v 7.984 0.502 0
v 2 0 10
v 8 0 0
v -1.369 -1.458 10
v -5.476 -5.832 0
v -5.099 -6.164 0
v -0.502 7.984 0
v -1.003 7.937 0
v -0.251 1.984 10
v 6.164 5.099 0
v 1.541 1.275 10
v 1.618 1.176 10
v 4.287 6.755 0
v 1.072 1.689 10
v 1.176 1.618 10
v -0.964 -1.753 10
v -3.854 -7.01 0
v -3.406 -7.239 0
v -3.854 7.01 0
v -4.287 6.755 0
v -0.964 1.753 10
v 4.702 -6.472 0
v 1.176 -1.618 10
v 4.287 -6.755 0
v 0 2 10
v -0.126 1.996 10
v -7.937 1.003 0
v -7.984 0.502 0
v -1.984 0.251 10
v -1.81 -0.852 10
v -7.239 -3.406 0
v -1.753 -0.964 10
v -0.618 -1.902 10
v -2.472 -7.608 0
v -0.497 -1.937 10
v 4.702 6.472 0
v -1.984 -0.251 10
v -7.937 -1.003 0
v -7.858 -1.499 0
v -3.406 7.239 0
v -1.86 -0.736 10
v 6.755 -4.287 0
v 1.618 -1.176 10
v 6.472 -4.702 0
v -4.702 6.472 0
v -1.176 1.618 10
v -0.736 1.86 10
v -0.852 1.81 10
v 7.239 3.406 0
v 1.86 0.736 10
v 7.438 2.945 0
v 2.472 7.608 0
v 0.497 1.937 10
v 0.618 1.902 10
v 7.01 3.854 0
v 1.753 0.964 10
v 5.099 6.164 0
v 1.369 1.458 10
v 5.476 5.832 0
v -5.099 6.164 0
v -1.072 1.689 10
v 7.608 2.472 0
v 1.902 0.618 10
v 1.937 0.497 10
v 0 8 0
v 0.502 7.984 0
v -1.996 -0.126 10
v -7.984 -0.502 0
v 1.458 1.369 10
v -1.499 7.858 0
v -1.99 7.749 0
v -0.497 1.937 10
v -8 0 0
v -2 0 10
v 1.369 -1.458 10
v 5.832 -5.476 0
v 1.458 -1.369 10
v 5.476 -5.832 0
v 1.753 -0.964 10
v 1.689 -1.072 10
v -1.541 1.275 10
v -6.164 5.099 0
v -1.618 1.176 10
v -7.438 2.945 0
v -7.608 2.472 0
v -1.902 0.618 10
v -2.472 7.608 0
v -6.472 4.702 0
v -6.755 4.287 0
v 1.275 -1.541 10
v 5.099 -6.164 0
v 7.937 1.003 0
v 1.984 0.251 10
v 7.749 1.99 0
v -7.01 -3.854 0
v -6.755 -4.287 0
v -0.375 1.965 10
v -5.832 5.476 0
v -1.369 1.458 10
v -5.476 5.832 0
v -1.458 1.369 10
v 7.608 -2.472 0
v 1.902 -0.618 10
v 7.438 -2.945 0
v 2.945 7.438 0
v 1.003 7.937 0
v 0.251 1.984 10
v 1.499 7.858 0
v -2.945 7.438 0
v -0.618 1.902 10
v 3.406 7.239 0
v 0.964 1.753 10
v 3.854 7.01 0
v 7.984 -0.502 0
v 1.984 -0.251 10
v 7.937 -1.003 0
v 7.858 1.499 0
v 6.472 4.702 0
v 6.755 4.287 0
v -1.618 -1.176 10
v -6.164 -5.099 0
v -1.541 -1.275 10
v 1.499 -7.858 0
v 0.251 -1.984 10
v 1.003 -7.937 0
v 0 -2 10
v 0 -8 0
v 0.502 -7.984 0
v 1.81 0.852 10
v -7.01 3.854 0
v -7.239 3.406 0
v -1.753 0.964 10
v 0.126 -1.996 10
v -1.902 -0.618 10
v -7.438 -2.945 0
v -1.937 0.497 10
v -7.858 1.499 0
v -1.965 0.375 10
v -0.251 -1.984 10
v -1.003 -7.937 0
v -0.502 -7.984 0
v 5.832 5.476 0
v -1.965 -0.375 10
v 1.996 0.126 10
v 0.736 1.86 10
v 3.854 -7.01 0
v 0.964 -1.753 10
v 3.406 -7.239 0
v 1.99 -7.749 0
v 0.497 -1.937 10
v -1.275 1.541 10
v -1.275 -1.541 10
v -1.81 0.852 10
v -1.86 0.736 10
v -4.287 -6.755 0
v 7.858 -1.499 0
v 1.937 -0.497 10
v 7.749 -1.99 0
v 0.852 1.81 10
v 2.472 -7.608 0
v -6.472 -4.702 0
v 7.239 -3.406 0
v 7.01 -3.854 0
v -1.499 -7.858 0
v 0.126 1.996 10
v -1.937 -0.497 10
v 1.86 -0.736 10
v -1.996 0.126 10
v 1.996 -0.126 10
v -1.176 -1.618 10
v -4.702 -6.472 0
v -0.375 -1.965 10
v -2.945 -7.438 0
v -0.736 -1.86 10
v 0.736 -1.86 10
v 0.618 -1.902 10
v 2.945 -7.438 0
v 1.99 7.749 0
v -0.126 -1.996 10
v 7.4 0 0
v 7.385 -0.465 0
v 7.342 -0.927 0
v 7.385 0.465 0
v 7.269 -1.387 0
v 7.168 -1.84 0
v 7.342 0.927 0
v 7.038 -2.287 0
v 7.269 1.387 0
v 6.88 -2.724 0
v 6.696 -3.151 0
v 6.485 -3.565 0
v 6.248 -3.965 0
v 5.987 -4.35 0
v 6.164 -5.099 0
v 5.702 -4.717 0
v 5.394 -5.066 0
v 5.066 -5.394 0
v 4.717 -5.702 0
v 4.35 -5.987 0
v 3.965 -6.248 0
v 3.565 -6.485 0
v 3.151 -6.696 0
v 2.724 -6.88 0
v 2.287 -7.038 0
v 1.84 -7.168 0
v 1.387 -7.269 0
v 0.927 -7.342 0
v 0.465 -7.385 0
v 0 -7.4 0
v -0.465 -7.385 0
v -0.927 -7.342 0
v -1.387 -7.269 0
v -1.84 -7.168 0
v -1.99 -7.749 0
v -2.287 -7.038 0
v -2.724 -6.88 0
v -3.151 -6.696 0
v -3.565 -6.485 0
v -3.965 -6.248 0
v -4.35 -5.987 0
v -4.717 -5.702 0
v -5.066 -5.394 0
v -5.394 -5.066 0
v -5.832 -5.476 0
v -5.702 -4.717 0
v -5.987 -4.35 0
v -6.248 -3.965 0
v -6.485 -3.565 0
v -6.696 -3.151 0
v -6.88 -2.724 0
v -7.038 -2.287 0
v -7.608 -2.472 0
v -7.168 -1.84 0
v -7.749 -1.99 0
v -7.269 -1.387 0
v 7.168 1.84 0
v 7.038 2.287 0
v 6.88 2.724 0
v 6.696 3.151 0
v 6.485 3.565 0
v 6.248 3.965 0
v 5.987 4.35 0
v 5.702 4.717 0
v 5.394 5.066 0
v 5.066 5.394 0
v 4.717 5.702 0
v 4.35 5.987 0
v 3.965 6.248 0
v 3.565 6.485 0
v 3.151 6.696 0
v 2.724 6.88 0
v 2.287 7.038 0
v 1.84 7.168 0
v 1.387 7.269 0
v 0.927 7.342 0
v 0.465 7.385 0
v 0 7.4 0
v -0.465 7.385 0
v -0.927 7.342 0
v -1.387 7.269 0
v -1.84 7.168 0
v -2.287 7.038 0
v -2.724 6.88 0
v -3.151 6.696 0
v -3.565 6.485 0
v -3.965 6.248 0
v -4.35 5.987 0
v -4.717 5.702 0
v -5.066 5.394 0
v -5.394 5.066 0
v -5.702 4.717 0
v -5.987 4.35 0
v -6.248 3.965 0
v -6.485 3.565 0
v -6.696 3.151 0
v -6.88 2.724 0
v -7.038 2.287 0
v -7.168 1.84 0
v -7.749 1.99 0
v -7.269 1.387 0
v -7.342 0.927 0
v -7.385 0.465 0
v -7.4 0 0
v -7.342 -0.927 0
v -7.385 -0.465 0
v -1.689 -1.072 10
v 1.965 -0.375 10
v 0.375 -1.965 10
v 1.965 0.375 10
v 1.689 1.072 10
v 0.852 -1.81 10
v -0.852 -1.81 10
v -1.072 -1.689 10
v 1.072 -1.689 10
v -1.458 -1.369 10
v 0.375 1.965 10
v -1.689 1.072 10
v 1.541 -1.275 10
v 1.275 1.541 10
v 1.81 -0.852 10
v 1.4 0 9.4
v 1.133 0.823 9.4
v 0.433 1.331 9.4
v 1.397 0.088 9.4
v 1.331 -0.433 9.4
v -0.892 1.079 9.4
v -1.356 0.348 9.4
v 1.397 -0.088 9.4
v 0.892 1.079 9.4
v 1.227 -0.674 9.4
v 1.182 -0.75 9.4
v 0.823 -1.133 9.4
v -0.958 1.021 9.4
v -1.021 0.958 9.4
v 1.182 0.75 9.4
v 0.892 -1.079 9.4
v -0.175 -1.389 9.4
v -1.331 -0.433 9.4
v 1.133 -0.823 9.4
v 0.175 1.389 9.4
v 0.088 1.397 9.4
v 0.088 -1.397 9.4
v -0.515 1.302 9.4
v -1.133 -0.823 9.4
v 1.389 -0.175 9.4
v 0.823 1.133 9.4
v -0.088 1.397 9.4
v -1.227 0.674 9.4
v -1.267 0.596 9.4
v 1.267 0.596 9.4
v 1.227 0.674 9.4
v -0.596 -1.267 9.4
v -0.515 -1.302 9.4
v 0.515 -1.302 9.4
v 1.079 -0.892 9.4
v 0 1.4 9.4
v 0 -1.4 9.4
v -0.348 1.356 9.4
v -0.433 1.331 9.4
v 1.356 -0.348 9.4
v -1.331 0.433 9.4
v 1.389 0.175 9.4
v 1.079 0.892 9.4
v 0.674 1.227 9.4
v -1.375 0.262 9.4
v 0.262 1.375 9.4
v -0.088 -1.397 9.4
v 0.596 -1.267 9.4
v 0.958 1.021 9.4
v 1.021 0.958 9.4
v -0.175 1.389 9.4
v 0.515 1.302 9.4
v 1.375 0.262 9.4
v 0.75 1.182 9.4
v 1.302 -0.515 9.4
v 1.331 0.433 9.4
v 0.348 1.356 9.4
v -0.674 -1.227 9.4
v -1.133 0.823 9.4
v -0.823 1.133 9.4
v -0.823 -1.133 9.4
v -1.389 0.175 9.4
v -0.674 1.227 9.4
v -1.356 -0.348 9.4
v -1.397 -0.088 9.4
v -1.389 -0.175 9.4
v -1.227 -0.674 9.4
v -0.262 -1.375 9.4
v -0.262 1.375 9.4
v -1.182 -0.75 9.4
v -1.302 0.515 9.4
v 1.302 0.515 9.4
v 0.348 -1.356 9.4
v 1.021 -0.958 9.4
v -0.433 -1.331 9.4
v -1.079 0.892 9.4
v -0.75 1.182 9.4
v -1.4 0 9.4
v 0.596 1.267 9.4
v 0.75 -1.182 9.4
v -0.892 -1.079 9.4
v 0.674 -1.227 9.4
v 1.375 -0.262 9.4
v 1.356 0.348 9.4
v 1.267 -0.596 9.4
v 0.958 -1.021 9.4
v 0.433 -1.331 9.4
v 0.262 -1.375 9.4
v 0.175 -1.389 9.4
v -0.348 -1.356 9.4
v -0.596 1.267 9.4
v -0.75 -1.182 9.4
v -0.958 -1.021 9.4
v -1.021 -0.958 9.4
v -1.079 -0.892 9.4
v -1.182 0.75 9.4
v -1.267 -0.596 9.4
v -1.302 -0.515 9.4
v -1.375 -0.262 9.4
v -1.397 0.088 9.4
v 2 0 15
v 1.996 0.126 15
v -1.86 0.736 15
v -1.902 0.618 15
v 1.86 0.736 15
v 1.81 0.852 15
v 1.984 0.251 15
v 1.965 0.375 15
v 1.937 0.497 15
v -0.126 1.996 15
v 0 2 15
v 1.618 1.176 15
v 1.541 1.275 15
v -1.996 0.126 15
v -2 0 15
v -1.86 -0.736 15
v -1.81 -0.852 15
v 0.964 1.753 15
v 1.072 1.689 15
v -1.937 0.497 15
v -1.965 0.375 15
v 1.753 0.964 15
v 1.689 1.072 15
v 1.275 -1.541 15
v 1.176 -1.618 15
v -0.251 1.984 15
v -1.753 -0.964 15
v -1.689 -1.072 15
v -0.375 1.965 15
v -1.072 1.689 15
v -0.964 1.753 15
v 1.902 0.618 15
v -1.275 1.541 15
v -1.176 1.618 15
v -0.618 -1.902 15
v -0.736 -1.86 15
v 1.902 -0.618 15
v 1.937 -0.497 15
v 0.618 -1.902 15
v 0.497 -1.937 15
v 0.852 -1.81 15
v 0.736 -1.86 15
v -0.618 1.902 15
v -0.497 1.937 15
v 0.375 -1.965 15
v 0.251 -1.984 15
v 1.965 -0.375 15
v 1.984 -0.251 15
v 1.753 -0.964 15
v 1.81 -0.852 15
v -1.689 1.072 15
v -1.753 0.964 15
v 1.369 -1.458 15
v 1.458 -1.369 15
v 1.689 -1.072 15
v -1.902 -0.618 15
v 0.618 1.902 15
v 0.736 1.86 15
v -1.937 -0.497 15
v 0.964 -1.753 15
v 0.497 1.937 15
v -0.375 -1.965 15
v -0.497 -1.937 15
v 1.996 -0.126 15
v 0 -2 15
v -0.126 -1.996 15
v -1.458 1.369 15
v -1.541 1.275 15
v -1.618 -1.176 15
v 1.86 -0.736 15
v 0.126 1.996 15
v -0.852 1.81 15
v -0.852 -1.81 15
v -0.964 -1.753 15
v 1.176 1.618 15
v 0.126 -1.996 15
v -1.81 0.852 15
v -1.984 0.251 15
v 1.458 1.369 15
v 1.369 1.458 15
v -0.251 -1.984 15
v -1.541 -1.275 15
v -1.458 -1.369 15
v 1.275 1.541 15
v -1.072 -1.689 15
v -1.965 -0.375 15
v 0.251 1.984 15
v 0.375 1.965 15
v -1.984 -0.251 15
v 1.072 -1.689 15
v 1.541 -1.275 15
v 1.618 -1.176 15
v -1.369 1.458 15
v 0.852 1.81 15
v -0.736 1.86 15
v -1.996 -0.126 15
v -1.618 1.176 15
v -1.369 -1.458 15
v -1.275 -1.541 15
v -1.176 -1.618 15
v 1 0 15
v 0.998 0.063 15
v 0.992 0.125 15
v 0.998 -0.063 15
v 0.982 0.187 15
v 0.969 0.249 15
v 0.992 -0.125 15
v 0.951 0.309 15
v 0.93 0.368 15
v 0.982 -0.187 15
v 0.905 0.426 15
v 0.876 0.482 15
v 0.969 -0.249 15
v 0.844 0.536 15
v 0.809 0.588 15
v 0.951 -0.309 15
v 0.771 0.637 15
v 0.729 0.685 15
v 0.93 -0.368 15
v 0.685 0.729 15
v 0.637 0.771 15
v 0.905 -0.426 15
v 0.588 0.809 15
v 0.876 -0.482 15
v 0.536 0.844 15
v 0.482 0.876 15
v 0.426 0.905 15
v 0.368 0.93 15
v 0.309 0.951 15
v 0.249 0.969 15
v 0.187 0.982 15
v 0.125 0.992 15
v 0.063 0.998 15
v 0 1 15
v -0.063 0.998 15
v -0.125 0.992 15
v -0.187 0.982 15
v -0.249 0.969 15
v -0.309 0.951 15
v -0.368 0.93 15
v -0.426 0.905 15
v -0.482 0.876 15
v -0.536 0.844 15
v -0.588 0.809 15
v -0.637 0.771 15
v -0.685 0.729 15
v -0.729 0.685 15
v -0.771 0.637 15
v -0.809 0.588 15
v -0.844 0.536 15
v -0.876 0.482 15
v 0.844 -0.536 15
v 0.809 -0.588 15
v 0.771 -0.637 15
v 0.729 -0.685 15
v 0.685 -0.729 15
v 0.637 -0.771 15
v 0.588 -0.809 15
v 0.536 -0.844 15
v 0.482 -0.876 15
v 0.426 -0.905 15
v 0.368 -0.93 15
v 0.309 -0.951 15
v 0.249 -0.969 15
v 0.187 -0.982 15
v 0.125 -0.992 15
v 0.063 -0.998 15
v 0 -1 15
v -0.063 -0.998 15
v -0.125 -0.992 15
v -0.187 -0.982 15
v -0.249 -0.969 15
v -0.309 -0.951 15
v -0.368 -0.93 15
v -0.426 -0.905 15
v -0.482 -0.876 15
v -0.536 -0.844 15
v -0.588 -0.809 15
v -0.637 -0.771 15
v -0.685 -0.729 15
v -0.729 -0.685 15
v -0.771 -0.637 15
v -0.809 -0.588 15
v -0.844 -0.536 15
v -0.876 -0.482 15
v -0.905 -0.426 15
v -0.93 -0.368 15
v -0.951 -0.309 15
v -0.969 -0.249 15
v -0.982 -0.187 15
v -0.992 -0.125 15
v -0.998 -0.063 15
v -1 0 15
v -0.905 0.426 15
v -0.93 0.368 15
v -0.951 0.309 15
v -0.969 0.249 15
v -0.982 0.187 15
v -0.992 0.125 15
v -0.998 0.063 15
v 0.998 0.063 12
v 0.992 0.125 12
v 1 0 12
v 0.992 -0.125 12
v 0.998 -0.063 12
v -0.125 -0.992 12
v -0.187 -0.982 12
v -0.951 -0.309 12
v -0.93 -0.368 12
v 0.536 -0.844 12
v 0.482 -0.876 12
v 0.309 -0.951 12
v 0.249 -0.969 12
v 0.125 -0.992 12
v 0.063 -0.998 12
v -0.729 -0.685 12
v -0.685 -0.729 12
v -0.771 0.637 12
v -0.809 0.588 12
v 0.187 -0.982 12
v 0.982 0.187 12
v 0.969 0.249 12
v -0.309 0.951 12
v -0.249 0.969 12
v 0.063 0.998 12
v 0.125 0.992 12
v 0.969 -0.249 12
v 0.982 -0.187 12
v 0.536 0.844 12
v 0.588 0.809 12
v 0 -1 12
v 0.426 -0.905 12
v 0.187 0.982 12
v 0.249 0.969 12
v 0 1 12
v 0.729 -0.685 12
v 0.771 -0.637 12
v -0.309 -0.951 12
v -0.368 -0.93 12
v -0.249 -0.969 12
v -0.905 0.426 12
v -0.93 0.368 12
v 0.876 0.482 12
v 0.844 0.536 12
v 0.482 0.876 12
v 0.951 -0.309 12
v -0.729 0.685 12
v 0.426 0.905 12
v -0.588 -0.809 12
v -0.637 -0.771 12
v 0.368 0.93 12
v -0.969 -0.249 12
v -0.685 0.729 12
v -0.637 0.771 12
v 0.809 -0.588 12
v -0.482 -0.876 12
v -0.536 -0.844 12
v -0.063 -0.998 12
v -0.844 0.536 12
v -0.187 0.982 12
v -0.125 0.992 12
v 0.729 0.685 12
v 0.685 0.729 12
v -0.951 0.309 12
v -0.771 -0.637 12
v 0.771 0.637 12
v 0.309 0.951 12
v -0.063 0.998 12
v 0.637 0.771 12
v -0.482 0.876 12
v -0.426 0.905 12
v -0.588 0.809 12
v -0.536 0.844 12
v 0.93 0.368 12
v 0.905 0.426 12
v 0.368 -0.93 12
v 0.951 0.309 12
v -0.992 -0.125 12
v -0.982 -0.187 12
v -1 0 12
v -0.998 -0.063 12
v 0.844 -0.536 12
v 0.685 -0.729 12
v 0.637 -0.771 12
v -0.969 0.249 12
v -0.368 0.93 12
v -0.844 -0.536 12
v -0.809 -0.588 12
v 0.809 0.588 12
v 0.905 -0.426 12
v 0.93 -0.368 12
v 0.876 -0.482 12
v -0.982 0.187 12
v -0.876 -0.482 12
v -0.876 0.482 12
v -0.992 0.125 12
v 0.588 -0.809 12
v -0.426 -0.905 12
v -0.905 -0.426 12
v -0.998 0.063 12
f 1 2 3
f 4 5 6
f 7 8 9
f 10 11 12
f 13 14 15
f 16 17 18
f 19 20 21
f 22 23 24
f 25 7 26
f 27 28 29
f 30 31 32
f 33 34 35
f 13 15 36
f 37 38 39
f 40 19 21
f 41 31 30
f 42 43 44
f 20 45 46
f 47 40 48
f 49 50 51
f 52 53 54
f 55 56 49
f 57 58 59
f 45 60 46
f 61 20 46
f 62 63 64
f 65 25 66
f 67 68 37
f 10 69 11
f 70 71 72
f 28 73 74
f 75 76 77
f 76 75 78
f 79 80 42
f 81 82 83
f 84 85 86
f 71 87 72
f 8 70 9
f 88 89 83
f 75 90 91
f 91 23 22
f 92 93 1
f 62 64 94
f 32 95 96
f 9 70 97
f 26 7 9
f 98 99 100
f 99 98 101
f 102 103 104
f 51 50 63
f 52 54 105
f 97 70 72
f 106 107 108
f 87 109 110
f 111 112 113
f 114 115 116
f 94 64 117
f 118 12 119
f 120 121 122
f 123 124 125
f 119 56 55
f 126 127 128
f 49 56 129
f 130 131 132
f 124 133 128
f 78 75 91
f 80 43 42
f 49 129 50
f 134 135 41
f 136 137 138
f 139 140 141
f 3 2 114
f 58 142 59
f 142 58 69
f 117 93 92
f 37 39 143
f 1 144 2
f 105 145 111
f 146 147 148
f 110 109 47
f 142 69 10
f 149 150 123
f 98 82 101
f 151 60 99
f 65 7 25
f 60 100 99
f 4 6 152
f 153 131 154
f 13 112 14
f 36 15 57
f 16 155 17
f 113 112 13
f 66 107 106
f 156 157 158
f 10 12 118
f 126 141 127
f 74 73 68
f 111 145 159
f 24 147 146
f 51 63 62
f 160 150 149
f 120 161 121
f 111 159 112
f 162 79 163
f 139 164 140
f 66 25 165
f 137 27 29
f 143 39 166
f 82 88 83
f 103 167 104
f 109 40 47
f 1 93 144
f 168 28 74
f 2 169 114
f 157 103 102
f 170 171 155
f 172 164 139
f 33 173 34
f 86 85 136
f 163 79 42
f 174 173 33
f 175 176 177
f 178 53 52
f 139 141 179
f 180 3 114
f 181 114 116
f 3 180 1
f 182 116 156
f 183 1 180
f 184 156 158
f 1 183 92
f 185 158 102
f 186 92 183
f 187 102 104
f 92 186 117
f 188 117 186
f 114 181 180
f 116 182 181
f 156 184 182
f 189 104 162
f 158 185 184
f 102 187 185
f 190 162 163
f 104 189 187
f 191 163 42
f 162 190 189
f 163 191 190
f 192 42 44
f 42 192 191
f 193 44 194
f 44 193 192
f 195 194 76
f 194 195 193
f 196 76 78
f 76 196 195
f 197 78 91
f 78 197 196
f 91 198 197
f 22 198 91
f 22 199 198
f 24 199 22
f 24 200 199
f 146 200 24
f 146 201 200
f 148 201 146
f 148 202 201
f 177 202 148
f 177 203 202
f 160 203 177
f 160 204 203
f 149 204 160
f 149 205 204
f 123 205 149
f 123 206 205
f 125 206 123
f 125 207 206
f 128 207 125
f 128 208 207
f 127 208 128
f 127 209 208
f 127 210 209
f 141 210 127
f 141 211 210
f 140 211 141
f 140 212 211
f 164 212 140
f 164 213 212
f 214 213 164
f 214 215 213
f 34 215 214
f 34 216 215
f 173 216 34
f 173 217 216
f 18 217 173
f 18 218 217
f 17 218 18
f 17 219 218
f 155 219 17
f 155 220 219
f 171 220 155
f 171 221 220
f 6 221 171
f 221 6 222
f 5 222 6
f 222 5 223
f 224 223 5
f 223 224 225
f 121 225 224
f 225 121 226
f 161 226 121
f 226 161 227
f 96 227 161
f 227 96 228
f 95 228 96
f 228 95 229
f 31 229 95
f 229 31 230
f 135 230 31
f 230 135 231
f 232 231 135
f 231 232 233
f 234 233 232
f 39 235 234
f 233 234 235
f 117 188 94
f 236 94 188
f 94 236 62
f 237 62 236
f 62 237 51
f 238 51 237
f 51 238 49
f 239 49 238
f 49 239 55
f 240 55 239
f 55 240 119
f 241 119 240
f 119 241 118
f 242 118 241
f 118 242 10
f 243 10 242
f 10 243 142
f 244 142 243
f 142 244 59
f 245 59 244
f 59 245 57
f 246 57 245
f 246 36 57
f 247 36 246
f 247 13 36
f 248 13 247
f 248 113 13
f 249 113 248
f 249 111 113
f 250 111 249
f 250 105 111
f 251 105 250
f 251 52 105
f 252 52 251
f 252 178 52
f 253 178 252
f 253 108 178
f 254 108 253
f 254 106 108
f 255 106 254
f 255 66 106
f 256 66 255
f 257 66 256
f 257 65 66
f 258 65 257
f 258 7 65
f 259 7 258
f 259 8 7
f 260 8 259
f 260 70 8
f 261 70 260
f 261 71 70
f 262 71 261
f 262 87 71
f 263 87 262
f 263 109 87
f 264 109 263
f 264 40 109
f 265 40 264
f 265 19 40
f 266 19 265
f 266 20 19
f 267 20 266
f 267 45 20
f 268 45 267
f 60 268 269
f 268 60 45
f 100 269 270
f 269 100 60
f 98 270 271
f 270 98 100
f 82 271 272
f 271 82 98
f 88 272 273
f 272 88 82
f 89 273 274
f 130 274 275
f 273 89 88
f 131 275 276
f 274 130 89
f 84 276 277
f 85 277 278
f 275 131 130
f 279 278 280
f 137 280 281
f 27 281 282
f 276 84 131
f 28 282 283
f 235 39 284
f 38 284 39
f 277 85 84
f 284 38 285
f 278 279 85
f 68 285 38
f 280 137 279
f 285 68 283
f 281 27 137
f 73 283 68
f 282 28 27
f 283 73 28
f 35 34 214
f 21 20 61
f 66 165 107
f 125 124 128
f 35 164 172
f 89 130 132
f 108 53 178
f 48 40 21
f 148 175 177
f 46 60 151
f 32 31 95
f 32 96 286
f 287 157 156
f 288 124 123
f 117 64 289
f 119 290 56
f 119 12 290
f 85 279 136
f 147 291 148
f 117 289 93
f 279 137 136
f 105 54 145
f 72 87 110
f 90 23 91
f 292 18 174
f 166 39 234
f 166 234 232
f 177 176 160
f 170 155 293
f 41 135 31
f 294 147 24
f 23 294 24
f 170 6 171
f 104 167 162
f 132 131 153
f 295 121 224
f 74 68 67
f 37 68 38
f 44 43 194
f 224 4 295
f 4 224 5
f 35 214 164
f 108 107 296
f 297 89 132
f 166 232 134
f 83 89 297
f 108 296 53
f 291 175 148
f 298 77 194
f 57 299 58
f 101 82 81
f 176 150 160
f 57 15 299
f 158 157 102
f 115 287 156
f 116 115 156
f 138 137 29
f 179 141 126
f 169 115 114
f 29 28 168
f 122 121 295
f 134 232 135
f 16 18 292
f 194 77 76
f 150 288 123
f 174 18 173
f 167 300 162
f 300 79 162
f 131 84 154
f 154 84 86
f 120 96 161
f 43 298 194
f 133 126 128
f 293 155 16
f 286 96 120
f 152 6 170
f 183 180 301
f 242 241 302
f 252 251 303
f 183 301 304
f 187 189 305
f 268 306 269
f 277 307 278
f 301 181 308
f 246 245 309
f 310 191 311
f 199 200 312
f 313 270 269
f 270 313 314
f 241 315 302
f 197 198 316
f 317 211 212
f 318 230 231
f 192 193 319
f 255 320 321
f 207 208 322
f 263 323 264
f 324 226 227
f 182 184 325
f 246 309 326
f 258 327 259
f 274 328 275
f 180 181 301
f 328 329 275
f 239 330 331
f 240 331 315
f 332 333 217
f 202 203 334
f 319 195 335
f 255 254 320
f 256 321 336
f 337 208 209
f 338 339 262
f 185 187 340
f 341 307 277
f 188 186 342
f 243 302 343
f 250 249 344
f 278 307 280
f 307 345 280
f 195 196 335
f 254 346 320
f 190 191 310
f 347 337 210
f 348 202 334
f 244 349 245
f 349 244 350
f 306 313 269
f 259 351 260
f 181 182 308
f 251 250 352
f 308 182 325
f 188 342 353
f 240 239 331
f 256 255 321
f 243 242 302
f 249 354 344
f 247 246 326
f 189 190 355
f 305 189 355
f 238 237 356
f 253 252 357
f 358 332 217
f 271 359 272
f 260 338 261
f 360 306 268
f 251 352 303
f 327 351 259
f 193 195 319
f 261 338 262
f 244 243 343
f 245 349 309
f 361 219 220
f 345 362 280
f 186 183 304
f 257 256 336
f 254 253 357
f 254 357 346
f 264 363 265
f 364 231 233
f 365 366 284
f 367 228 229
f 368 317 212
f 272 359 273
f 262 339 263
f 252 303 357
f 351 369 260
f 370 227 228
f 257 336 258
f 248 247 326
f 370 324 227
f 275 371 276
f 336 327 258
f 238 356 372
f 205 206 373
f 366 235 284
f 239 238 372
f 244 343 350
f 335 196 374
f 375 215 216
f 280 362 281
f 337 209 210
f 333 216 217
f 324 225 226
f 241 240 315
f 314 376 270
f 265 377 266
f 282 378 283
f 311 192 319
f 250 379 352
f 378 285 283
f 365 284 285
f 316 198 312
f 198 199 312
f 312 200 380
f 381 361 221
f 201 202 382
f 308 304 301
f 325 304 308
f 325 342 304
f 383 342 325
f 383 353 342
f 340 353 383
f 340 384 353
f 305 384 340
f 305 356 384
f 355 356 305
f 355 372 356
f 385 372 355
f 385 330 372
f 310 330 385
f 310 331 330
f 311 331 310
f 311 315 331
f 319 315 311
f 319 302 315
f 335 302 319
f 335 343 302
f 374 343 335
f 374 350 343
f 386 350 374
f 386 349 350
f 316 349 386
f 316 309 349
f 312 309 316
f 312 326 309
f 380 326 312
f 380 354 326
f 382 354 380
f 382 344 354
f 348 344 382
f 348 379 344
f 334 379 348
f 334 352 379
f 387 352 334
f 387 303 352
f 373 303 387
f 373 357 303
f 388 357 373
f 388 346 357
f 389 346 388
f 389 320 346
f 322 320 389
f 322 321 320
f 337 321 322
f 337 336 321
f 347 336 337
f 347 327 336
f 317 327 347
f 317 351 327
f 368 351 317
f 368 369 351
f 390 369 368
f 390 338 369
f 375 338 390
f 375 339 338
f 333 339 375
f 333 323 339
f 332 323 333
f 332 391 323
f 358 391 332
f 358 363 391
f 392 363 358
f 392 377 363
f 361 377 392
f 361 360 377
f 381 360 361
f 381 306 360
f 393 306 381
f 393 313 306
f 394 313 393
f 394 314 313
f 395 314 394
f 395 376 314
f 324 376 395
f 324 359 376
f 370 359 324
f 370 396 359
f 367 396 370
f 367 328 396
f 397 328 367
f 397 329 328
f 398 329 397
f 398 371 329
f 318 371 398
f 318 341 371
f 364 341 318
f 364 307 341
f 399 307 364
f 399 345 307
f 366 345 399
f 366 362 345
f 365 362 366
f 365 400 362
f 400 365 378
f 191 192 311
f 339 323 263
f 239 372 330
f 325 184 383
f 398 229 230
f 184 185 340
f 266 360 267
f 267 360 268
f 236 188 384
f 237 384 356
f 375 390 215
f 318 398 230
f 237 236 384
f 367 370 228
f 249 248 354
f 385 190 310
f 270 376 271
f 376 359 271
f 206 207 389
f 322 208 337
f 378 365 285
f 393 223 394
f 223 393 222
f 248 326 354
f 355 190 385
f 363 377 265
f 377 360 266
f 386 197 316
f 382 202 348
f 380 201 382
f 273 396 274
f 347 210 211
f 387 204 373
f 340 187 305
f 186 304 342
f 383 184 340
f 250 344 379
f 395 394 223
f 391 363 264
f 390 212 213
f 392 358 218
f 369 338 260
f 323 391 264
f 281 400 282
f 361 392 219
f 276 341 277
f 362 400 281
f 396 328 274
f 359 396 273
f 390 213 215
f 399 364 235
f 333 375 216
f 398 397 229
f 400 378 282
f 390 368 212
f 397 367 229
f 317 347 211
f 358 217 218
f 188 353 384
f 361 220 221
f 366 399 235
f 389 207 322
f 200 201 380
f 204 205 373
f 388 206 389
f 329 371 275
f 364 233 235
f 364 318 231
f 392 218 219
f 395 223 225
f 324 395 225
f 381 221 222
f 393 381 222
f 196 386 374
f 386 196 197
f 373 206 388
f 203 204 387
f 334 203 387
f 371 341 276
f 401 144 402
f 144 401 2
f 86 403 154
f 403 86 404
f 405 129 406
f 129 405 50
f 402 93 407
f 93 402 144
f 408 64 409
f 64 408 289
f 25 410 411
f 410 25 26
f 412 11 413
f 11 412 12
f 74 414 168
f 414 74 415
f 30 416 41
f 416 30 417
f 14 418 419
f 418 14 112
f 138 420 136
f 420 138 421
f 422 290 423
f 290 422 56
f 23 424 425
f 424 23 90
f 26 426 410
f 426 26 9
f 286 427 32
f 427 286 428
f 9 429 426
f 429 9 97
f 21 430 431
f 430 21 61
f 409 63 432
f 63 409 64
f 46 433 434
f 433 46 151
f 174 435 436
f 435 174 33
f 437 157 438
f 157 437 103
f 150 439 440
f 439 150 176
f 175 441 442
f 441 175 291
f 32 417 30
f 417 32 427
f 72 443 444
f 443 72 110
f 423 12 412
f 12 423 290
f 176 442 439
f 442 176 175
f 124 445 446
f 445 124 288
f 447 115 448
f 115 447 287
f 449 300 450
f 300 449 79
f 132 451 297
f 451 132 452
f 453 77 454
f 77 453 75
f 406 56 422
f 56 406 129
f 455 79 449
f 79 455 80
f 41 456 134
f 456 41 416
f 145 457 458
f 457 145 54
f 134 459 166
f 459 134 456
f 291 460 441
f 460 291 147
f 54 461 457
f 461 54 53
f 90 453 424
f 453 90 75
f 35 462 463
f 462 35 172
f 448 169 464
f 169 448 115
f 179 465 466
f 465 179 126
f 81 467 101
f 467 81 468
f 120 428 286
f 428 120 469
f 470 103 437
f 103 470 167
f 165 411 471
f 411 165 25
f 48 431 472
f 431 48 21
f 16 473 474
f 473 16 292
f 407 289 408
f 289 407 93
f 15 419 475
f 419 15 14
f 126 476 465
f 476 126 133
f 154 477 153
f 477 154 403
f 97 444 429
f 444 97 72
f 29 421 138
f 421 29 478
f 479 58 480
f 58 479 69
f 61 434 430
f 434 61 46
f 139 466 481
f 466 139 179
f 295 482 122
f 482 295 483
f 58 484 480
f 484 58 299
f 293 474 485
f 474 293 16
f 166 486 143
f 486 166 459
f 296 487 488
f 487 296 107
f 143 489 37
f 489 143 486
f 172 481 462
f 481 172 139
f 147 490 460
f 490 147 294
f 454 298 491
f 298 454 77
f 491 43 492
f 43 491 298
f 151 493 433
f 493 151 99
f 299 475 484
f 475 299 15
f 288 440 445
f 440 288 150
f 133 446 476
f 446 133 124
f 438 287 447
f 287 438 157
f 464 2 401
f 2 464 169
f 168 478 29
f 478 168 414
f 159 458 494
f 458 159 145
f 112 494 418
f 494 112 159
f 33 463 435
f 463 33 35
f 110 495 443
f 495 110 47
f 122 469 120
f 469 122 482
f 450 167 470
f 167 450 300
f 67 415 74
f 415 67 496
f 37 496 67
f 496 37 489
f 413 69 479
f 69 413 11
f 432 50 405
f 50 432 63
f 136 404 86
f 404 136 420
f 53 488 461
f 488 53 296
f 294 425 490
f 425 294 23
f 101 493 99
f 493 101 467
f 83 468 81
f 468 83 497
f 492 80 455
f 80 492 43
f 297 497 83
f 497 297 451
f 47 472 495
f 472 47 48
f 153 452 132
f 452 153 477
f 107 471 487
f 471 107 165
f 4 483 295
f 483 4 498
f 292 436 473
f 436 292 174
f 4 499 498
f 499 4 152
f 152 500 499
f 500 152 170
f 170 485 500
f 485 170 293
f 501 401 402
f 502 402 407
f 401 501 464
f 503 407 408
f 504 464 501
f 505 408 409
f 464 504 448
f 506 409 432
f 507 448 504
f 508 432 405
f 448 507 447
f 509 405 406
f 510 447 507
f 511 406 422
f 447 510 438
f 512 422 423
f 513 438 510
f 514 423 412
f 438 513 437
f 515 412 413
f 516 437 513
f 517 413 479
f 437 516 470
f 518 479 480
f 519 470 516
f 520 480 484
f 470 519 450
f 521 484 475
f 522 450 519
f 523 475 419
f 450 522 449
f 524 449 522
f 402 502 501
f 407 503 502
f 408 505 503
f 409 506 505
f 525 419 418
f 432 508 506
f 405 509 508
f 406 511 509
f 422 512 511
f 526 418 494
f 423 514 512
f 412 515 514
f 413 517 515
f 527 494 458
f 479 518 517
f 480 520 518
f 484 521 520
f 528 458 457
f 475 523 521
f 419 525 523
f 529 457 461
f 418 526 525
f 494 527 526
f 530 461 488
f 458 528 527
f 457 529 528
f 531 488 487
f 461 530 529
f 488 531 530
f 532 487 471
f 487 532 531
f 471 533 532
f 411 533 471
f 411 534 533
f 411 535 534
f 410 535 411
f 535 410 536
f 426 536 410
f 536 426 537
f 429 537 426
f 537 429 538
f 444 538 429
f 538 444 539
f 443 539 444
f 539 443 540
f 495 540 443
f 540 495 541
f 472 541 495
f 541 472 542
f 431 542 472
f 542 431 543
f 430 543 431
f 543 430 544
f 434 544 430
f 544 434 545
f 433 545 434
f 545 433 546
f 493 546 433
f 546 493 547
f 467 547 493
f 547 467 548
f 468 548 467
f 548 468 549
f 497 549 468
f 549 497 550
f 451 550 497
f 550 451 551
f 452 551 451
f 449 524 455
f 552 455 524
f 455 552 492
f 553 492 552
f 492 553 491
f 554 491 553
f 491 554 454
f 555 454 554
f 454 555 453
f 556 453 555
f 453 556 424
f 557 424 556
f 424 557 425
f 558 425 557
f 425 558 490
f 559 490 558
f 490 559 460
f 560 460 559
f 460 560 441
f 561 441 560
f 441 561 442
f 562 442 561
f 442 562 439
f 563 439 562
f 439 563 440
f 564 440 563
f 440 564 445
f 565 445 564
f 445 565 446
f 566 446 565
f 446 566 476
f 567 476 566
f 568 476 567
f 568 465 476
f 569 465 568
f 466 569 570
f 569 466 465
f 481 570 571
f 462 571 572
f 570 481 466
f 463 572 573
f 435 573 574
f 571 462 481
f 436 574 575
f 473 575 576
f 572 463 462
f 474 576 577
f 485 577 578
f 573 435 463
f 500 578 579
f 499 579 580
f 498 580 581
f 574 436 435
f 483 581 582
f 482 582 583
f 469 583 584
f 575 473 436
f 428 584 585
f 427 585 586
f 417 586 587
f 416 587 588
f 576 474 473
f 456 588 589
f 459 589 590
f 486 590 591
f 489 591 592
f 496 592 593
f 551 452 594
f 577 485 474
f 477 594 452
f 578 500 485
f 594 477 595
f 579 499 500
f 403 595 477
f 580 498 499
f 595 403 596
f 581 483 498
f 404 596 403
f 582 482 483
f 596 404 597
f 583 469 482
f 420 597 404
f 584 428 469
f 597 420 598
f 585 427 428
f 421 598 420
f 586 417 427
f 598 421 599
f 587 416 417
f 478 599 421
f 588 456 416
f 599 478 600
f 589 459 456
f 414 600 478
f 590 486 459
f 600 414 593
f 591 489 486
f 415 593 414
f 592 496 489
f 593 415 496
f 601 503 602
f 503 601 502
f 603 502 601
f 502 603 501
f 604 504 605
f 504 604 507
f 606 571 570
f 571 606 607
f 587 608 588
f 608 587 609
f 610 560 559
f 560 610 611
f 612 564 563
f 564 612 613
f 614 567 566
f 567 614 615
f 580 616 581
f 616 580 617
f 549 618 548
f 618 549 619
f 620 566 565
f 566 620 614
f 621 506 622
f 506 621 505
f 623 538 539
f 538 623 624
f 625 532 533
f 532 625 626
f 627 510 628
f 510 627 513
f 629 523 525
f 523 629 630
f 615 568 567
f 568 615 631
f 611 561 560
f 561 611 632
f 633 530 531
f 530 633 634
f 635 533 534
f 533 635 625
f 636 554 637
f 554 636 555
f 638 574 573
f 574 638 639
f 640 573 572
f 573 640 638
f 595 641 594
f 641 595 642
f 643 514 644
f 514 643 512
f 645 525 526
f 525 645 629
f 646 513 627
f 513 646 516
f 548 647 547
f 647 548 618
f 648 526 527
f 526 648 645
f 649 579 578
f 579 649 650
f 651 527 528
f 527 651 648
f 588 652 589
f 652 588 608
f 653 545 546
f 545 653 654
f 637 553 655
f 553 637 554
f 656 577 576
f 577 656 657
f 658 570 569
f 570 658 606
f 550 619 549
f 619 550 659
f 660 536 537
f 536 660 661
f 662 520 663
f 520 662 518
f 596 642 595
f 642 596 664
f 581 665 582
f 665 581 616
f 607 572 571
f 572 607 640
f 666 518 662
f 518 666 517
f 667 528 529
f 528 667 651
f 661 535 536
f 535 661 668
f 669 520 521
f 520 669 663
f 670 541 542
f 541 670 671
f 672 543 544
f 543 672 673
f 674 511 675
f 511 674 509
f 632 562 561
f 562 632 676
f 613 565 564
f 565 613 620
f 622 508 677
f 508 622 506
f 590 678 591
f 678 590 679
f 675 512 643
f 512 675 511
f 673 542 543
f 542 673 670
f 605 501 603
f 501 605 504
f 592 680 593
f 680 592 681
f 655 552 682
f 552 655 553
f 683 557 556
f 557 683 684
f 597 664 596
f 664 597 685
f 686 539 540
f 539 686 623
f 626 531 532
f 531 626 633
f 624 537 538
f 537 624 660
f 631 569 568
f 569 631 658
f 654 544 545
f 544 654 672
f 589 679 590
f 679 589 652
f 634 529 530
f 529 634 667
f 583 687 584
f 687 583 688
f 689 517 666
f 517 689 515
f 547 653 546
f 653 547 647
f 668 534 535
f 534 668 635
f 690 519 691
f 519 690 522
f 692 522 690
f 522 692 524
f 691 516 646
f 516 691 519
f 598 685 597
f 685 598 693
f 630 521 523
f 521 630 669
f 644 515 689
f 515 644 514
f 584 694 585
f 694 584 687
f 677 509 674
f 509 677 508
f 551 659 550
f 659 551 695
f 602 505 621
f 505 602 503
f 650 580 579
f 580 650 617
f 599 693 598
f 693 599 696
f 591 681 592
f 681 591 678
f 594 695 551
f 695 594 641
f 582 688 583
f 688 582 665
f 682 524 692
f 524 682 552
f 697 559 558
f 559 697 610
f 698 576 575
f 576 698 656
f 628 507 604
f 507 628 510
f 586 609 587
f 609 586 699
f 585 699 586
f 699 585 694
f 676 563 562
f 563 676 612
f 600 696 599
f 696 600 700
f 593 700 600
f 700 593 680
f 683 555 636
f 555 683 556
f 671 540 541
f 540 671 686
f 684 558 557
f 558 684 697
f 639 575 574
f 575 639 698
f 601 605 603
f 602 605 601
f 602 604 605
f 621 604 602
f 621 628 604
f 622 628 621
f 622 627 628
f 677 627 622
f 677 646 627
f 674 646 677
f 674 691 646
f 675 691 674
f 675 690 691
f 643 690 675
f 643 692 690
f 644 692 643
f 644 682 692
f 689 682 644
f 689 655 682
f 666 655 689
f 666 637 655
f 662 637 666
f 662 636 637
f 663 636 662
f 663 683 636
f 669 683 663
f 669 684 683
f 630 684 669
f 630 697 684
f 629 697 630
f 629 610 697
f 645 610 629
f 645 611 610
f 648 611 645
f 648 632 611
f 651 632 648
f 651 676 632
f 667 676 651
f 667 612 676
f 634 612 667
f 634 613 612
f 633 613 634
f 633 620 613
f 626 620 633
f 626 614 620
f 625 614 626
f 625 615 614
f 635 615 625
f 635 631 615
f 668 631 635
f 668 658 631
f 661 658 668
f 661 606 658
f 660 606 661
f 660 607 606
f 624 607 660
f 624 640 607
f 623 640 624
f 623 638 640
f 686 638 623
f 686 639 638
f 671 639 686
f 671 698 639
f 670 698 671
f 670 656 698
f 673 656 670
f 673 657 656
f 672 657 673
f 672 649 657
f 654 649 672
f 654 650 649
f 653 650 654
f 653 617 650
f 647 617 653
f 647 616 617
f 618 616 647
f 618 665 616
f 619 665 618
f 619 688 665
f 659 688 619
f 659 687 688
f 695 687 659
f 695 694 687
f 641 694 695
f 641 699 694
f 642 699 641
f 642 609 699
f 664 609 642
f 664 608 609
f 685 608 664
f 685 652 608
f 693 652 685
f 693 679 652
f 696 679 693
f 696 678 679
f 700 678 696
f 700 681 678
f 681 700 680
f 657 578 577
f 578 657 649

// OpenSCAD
// Outside diameter of cone base. (All measurements are in millimeters!!)
cone_diameter = 16;
// Height of cone.
cone_height = 10;
//Thickness of cone walls.
wall = 0.6;
// Outside diameter of neck.
neck_diameter = 4;
// Height of neck.
neck_height = 5;
// Diameter of hole for dart. (Depth of hole is automatically 2mm less than neck height.)
hole_size = 2;
union() {
difference() {
    // bottom cylinder
    cylinder(h = cone_height, r1 = cone_diameter/2, r2 = neck_diameter/2, center = false, $fn=100);
    // inside cylinder
    cylinder (h = cone_height - wall, r1 = cone_diameter/2 - wall, r2 = neck_diameter/2 - wall, center = false, $fn=100);
}
difference() {
    // neck
    translate([0,0,cone_height]) cylinder(h = neck_height, r = neck_diameter/2, $fn=100);
    // shaft hole
    translate([0,0,cone_height + 2]) cylinder(h = neck_height - 2, r = hole_size/2, $fn=100);
}
}
    
